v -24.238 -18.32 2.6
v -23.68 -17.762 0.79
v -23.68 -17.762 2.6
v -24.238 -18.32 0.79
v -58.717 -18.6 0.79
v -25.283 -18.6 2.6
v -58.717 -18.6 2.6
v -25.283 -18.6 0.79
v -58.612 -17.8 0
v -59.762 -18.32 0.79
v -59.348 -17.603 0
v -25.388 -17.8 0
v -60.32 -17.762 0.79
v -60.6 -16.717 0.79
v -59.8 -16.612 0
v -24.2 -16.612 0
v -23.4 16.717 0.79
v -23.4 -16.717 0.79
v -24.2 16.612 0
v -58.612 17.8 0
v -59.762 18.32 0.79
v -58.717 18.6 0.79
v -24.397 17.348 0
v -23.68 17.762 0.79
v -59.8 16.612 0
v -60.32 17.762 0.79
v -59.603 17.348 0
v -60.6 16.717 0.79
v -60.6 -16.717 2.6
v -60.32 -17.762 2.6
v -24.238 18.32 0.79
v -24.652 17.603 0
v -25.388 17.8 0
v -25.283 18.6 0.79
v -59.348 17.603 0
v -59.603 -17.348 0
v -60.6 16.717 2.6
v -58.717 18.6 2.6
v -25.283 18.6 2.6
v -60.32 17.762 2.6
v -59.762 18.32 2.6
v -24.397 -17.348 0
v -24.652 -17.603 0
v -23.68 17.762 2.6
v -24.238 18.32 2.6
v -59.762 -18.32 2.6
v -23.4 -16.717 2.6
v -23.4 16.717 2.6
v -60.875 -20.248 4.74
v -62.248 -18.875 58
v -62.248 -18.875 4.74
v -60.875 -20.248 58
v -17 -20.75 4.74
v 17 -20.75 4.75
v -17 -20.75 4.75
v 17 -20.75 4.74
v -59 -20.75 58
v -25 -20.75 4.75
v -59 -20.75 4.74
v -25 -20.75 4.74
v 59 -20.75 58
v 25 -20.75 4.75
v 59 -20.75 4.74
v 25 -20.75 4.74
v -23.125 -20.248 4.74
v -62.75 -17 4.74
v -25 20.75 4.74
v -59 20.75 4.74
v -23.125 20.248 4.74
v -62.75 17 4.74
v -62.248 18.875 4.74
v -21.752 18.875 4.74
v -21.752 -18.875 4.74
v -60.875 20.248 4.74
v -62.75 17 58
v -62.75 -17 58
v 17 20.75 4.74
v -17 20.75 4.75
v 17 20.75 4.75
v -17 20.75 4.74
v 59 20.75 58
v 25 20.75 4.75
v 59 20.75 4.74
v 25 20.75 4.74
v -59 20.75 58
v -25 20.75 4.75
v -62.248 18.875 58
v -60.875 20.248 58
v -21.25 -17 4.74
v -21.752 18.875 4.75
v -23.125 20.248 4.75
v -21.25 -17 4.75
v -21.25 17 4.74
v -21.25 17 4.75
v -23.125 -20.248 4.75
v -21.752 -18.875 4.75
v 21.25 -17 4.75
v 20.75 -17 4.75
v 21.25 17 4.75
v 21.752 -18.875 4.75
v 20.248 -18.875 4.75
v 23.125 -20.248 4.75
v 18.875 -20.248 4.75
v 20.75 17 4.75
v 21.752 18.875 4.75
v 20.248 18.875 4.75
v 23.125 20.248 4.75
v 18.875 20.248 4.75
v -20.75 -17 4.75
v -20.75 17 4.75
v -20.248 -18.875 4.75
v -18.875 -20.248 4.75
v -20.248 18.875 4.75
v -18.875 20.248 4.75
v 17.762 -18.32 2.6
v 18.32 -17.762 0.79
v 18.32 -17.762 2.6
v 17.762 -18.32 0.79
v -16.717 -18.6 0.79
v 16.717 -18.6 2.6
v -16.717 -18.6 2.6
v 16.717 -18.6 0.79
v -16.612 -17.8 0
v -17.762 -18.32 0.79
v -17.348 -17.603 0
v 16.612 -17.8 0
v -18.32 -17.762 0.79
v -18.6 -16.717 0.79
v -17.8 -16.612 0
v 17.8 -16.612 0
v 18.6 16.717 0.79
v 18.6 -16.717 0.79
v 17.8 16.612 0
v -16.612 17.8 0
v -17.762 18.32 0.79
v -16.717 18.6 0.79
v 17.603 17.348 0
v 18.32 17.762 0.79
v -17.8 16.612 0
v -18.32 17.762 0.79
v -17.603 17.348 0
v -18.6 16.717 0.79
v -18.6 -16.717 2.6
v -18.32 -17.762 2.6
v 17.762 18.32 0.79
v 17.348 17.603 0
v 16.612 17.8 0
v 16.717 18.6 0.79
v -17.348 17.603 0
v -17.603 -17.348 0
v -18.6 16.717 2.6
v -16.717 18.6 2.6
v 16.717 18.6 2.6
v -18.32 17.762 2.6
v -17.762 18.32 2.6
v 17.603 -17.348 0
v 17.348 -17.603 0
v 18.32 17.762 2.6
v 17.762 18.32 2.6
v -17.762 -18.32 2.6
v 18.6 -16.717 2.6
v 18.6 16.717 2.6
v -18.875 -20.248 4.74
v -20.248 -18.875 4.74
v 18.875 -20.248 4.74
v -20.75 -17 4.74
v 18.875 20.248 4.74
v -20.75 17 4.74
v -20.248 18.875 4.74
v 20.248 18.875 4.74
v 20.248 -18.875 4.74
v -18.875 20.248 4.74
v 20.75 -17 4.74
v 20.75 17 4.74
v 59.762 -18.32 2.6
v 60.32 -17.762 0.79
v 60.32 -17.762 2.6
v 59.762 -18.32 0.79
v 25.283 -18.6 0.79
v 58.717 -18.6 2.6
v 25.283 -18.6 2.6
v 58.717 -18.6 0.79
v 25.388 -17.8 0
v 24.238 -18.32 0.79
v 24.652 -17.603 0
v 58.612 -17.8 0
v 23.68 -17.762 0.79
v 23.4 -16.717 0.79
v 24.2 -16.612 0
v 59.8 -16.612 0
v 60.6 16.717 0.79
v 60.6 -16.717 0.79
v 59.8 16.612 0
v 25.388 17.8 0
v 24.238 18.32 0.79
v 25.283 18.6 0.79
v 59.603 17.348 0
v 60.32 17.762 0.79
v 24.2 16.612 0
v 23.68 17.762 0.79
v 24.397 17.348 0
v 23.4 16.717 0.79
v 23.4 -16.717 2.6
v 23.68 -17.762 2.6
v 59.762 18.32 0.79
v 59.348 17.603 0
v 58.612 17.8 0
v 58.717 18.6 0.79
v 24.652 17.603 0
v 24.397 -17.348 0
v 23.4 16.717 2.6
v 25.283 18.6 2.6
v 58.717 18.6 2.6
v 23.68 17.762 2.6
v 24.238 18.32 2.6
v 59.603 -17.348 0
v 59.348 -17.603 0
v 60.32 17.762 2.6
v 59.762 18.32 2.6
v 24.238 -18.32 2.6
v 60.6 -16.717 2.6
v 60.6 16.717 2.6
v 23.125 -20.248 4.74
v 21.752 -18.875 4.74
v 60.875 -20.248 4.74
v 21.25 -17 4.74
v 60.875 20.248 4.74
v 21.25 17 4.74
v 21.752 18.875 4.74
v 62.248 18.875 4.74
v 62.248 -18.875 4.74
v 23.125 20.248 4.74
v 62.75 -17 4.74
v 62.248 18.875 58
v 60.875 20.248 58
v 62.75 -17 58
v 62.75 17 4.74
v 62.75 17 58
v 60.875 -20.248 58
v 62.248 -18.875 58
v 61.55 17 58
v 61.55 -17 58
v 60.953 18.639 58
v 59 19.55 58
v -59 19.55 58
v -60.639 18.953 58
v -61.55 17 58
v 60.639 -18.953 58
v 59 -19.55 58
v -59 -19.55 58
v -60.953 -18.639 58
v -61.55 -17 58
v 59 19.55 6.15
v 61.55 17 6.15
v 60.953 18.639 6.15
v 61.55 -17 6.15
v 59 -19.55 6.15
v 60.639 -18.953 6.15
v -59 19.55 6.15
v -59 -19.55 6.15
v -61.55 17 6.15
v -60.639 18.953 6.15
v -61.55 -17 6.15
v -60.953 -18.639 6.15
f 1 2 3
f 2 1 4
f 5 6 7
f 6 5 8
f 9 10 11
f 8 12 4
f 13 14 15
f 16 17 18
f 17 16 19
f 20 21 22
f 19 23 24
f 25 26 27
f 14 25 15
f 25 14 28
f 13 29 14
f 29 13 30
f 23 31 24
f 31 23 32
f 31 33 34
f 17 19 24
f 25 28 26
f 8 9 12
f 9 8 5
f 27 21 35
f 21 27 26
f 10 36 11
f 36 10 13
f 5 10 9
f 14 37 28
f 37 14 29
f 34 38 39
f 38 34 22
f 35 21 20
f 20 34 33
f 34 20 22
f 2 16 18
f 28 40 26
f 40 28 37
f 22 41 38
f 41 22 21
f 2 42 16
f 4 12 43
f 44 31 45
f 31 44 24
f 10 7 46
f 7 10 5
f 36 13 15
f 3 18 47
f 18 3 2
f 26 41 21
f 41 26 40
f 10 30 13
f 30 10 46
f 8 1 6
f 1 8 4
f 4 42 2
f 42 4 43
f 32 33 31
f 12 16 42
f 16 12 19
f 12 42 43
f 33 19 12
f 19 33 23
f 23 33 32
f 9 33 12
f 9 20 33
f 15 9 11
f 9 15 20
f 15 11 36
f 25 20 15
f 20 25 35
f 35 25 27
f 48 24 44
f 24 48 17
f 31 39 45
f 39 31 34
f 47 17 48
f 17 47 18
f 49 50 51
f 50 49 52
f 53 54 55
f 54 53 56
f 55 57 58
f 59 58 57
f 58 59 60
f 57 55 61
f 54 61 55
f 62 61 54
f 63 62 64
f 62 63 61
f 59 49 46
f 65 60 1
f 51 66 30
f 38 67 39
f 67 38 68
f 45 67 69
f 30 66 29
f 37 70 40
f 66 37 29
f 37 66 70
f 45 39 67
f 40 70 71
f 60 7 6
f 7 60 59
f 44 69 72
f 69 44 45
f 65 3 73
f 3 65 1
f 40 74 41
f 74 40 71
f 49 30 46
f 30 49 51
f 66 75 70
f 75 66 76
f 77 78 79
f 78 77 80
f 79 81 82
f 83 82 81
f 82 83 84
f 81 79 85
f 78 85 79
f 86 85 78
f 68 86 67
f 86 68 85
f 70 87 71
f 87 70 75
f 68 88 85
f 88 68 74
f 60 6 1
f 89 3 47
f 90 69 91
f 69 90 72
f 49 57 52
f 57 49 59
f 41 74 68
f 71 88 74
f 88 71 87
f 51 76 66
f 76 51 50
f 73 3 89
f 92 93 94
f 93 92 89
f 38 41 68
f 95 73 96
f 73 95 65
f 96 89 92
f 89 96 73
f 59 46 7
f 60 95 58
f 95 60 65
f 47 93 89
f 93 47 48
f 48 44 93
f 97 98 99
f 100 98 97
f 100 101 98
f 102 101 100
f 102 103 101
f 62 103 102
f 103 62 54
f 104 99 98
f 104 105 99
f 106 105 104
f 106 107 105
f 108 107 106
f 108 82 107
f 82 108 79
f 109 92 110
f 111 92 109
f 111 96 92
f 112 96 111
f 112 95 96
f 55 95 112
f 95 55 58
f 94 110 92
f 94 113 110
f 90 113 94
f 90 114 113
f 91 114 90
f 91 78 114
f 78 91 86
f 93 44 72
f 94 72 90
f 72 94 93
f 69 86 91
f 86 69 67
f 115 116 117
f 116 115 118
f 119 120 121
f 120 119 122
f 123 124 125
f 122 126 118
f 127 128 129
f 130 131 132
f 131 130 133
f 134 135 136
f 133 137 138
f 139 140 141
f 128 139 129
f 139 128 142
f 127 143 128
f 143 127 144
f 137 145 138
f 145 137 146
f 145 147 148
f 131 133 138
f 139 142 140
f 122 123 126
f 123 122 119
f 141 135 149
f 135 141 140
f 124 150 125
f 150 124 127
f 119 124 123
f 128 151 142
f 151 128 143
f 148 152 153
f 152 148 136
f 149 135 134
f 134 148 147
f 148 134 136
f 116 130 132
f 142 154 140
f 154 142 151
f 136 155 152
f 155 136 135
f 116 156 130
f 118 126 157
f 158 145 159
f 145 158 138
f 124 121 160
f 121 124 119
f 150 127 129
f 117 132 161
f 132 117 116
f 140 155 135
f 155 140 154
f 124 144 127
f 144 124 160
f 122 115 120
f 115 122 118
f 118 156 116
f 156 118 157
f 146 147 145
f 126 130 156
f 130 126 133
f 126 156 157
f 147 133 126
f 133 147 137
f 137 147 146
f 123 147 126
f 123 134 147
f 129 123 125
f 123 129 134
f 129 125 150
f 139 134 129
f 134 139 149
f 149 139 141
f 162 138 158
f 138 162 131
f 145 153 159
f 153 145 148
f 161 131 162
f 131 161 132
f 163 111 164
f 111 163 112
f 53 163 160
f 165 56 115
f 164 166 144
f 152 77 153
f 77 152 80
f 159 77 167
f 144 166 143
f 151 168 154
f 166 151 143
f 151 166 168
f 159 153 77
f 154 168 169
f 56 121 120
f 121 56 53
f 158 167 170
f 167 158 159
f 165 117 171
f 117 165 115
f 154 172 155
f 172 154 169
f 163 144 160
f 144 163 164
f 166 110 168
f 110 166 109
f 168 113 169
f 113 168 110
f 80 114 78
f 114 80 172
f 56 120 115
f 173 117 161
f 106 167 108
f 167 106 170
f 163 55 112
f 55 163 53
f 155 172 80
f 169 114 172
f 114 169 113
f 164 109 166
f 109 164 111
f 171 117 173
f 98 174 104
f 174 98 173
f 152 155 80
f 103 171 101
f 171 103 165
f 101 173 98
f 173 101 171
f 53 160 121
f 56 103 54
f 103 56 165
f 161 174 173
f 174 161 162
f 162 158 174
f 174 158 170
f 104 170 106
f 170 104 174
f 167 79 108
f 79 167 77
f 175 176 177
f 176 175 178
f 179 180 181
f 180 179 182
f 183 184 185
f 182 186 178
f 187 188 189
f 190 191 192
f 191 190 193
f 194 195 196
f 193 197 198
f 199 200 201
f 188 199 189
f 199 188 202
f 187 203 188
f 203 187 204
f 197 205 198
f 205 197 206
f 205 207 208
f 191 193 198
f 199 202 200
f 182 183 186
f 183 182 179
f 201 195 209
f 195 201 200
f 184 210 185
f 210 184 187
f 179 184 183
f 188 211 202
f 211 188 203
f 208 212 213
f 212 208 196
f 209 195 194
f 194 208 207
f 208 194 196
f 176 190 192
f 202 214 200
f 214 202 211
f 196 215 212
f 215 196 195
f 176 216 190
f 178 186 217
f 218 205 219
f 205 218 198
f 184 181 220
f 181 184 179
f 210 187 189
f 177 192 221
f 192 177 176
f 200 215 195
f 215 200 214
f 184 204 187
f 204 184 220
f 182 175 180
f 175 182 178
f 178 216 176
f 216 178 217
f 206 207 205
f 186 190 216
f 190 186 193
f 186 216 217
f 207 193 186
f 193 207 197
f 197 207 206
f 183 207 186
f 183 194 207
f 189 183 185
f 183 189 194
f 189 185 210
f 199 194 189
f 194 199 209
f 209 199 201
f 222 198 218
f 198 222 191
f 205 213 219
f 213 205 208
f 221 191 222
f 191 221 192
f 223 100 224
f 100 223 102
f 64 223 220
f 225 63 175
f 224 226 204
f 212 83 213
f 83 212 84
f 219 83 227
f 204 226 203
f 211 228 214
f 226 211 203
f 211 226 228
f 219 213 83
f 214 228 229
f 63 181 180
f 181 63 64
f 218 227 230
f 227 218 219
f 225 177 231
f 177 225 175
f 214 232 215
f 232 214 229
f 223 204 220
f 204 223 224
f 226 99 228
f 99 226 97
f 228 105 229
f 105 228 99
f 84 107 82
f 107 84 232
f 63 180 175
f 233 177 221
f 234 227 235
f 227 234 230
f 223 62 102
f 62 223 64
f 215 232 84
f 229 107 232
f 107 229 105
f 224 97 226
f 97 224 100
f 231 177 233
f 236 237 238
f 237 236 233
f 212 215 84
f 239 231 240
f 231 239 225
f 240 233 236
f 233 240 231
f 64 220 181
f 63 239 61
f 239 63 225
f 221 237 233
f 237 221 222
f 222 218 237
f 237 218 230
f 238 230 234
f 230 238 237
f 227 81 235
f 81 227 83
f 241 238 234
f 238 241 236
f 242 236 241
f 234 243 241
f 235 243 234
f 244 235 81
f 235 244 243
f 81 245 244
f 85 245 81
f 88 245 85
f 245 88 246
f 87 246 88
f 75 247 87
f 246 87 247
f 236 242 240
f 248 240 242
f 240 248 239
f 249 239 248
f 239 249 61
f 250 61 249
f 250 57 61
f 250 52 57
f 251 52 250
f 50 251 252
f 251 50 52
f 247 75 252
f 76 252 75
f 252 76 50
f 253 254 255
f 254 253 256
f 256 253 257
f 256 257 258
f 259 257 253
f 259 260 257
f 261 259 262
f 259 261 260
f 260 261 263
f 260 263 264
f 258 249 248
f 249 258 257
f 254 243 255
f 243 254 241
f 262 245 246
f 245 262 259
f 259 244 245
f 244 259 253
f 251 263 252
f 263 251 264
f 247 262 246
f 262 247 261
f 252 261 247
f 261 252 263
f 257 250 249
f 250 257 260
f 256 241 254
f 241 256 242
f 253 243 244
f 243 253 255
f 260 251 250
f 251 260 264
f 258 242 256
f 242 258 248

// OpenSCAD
// file: ../lib/vessel.scad
// SPDX-License-Identifier: MIT
// Copyright (c) 2026 Aaron Cupp
//
// vessel.scad — parametric collar cups for bottles, cans, and pen-form tools.
//
// A collar cup is a solid Gridfinity block with cylindrical bores sunk into it.
// It LOCATES a vessel; it does not clamp one. That distinction is the whole
// design: a collar that grips harder than the bin weighs comes out of the
// baseplate with the bottle when you grab it one-handed. Clearance, not
// interference — CLR is per-diameter, not per-side.
//
// Capture depth is roughly a third of the vessel's height. Enough to resist a
// knock (this bench sits under a 180 W fume-extractor intake), not so much that
// you're fishing the bottle out.
//
//   collar_cup(nx, ny, vessel_d, capture_h, …)   — one centred bore
//   collar_cup_multi(nx, ny, bores, capture_h, …) — bores = [[x, y, d], …]
//
// Cord slot: pen-form tools that stand in a cup are usually corded (the HARDELL
// rotary tool takes a barrel jack). Without a slot the lead drapes over the rim
// and levers the tool sideways. `cord_w > 0` cuts a channel from the bore out
// through the wall, open to the top.

include <gridfinity.scad>

CLR      = 1.0;   // bore = vessel_d + CLR. Loose on purpose — see above.
MIN_WALL = 1.2;   // minimum material between two bores, and bore to outer face

// ---- geometry guards ----
// Overlapping bores and bores that break out through the side wall both still
// render as perfectly watertight, 2-manifold meshes — CI cannot tell you the
// part is wrong, only that it is closed. These asserts encode the intent that
// the mesh check can't. Cheap, and they fire at render time rather than on the
// printer.
function _pair_gaps(bores, clr) = [
    for (i = [0 : len(bores)-1], j = [0 : len(bores)-1]) if (i < j)
        norm([bores[i][0]-bores[j][0], bores[i][1]-bores[j][1]])
        - (bores[i][2]+clr)/2 - (bores[j][2]+clr)/2
];
function _edge_gaps(bores, clr, W, D) = [
    for (b = bores) min(W/2 - abs(b[0]) - (b[2]+clr)/2,
                        D/2 - abs(b[1]) - (b[2]+clr)/2)
];

// Multi-bore block. Bores are [x, y, diameter] in mm, relative to the block centre.
module collar_cup_multi(nx, ny, bores, capture_h, floor = 1.4, clr = CLR,
                        cord_w = 0, cord_at = 0, min_wall = MIN_WALL) {
    h = BIN_BASE_H + floor + capture_h;
    e = 0.1;
    W = nx*GF - 0.5; D = ny*GF - 0.5;
    _pg = _pair_gaps(bores, clr);
    _eg = _edge_gaps(bores, clr, W, D);
    assert(len(_pg) == 0 || min(_pg) >= min_wall,
           "collar_cup: bores are too close — they would merge into one pocket");
    assert(min(_eg) >= min_wall,
           "collar_cup: a bore breaches the outer wall — block needs more units");
    difference() {
        bin_blank(nx, ny, h);
        for (b = bores)
            translate([b[0], b[1], BIN_BASE_H + floor])
                cylinder(d = b[2] + clr, h = capture_h + e, $fn = 96);
        // Cord channel: from the first bore outward through the +X wall, open to
        // the rim so the lead drops in from above rather than threading.
        if (cord_w > 0)
            translate([bores[0][0], bores[0][1] - cord_w/2, BIN_BASE_H + floor + cord_at])
                cube([nx*GF, cord_w, h]);
    }
}

// Single centred bore — the common case.
module collar_cup(nx, ny, vessel_d, capture_h, floor = 1.4, clr = CLR,
                  cord_w = 0, cord_at = 0, min_wall = MIN_WALL) {
    collar_cup_multi(nx, ny, [[0, 0, vessel_d]], capture_h, floor, clr,
                     cord_w, cord_at, min_wall);
}

// Evenly spaced row of same-depth bores along X — for a rank of aerosol cans.
// Returns geometry, not a list; pass the diameters and it lays them out on the
// block's centre line.
module collar_cup_row(nx, ny, diameters, capture_h, floor = 1.4, clr = CLR,
                      min_wall = MIN_WALL) {
    n = len(diameters);
    pitch = nx * GF / n;
    collar_cup_multi(nx, ny,
        [for (i = [0 : n-1]) [(i - (n-1)/2) * pitch, 0, diameters[i]]],
        capture_h, floor, clr, 0, 0, min_wall);
}
// file: cleaning_station_common.scad
// cleaning_station_common.scad — shared parameters for the bench cleaning station.
//
// The IPA / contact-cleaner corner of the electronics repair bench. Everything
// here is measured off the actual items with calipers; nothing is a nominal from
// a product page. Diameters carry a per-diameter clearance (lib/vessel.scad CLR),
// not per-side.
//
// This corner sits under a fume-extractor intake, which drives two decisions:
//   * Cups CAPTURE the vessel rather than clamp it — a collar that grips harder
//     than the bin weighs lifts out of the baseplate with the bottle.
//   * Bins stay as low as the job allows. Capture velocity is decided in the
//     first six inches, and a wall of tall bins in front of the hood costs it.
//
// The aerosols are FLAMMABLE and this bench has a 400 °C iron on it. These cups
// are for working cans only; bulk stock belongs away from the hood entirely.
//
// SPDX-License-Identifier: CC-BY-NC-SA-4.0
// Copyright (c) 2026 Aaron Cupp

include <../lib/vessel.scad>

// ---- measured diameters (mm) ----
// DeoxIT bore: taken from the PART, not from a can measurement.
//
// The 2026-08-20 print had three bores — 57.00 / 55.20 / 52.75. The 57.00 fits a
// DeoxIT; 55.20 barely does; 52.75 holds nothing. So 57.00 is a validated bore,
// which beats re-deriving it from a can diameter plus a clearance guess. D5, F5
// and G5 are the same can, so one bore serves all three.
BORE_DEOXIT = 57.00;   // ✅ proven by the printed part

// Freeze spray is a DIFFERENT, LARGER can — 13 mm wider than a DeoxIT, which is
// why it never fitted a shared block.
D_FREEZE_SPRAY = 69.00;   // ✅ measured 2026-08-20 (was 56.00, badly wrong)
FREEZE_CLR     = 2.0;     // [1:0.5:4] -> 71.00 bore
FREEZE_MEASURED = true;

D_DISPENSER    = 53.50;   // 200 ml push-down alcohol pump, square base across flats
D_FLOOD_BOTTLE = 75.50;

// DeoxIT D100 / F100 / G100 concentrate droppers — bare bottles, out of their
// kit boxes. The boxes are a full 2×1 EACH; the three bare bottles share one.
// NOT ROUND — 39 × 20 is a flattened cross-section, not a diameter and a height.
D_DROPPER_L = 39.00;   // measured 2026-08-20, long axis of the footprint
D_DROPPER_W = 20.00;   // measured, short axis
DROPPER_CLR = 1.00;    // per dimension, matching the CLR convention
CAP_DROPPER = 26;      // [8:1:40] capture depth. ⚠️ bottle HEIGHT is unmeasured —
                       //   39 turned out to be a footprint, so the height nobody
                       //   has taken.
                       //   RAISED 15 → 26 on 2026-08-24: at 15 the brushes and
                       //   swabs fell over in their slots. Depth is what resists
                       //   an applicator tipping, and 15 mm of it on a ~100 mm
                       //   brush is almost none. 26 makes the whole block half
                       //   again as tall, which is what was asked for.
                       //   Read the bin_deoxit_droppers header before assuming
                       //   this alone fixes the tipping — it does not.

// ---- melamine sponges (mm) — 3.94 × 2.35 × 0.79 in ----
// Full block as sold. Bulk stock lives in the bag under the desk, ~100 of them;
// none of it competes for grid.
SPONGE_L = 100.1; SPONGE_W = 59.7; SPONGE_T = 20.1;

// WORKING size: a full block is far more sponge than any bench task needs, and
// melamine is consumed by abrasion — quartering one gets four uses out of what
// was one, and the smaller piece reaches between connectors where a 100 mm block
// cannot. Halve across, halve lengthwise.
CUT_L = SPONGE_L / 2;   // 50.05
CUT_W = SPONGE_W / 2;   // 29.85
CUT_T = SPONGE_T;       // 20.1 — unchanged, cuts are through the face

// ---- capture depth ----
// Vessel HEIGHTS were not measured, so this is a judgement call rather than a
// derived third-of-height: 50 mm resists a knock without making the bottles a
// two-handed retrieval. One number to change if the first print feels wrong.
CAPTURE = 50;

// Sponge bin: sponges stand ON EDGE (60 mm tall), ~4 across the 81 mm interior.
// On edge beats flat-stacked — same count in a 68 mm bin instead of a 107 mm one,
// and any sponge can be pinched out rather than peeling off the top of a pile.
// Height is set by a FULL block standing on edge, not a cut one — so one uncut
// block can still ride in the bin as reserve alongside the trimmed pieces.
// Cut pieces are 50 long, which is what lets the footprint drop to 2×2.
SPONGE_BIN_H = SPONGE_W + BIN_BASE_H + 1.4 + 2;   // ≈ 68
// main file
// bin_cleanroom_wipes — 3×1 open bin for cleanroom wipes, standing on end.
//
// AN OPEN BIN WITH NO WIPE DIMENSION IN IT. The wipes are 90 × 90 per the spec
// sheet, and that number is a red herring for this part: it describes a wipe
// opened out flat, not the shape it lives in. They are cloth-like and come in a
// plastic bag, so the bag conforms to whatever pocket it is given.
//
// Laid flat, a 90 mm wipe needs a 3×3. Stood on end in a 3×1 it does not have to
// lie flat at all: the interior is 123.1 × 39.1, so the 90 mm dimension runs
// along the length with room to spare and the stack fills the depth.
//
// So the only number here is depth, and that is a capacity choice. Change H if
// the bag wants more or less room; nothing else depends on it.
//
// PRINT: as emitted, feet down. No supports.
//
// SPDX-License-Identifier: CC-BY-NC-SA-4.0
// Copyright (c) 2026 Aaron Cupp
include <cleaning_station_common.scad>
include <../lib/gridfinity.scad>

NX = 3; NY = 1;   // 3×1 so they can stand on end — 123.1 mm of length
H  = 58;    // [20:1:70] ~39 mm of usable depth — a bag stands in it and you
            //   pull wipes off the top.
            //
            //   45 -> 58 on 2026-09-08. The ask was "25% taller", which is
            //   56.25 — but that lands 1.75 mm under bin_swabs and
            //   bin_micro_sponges, both of which stand at 58, and a step that
            //   size shows in a row of three. 58 is 29% taller and level.

WALL = 1.2; FLOOR = 1.4;

echo(str("interior ", NX*GF - 0.5 - 2*WALL, " x ", NY*GF - 0.5 - 2*WALL,
         " mm, usable depth ", H - BIN_BASE_H - FLOOR, " mm"));

bin(NX, NY, H, wall = WALL, floor = FLOOR);
